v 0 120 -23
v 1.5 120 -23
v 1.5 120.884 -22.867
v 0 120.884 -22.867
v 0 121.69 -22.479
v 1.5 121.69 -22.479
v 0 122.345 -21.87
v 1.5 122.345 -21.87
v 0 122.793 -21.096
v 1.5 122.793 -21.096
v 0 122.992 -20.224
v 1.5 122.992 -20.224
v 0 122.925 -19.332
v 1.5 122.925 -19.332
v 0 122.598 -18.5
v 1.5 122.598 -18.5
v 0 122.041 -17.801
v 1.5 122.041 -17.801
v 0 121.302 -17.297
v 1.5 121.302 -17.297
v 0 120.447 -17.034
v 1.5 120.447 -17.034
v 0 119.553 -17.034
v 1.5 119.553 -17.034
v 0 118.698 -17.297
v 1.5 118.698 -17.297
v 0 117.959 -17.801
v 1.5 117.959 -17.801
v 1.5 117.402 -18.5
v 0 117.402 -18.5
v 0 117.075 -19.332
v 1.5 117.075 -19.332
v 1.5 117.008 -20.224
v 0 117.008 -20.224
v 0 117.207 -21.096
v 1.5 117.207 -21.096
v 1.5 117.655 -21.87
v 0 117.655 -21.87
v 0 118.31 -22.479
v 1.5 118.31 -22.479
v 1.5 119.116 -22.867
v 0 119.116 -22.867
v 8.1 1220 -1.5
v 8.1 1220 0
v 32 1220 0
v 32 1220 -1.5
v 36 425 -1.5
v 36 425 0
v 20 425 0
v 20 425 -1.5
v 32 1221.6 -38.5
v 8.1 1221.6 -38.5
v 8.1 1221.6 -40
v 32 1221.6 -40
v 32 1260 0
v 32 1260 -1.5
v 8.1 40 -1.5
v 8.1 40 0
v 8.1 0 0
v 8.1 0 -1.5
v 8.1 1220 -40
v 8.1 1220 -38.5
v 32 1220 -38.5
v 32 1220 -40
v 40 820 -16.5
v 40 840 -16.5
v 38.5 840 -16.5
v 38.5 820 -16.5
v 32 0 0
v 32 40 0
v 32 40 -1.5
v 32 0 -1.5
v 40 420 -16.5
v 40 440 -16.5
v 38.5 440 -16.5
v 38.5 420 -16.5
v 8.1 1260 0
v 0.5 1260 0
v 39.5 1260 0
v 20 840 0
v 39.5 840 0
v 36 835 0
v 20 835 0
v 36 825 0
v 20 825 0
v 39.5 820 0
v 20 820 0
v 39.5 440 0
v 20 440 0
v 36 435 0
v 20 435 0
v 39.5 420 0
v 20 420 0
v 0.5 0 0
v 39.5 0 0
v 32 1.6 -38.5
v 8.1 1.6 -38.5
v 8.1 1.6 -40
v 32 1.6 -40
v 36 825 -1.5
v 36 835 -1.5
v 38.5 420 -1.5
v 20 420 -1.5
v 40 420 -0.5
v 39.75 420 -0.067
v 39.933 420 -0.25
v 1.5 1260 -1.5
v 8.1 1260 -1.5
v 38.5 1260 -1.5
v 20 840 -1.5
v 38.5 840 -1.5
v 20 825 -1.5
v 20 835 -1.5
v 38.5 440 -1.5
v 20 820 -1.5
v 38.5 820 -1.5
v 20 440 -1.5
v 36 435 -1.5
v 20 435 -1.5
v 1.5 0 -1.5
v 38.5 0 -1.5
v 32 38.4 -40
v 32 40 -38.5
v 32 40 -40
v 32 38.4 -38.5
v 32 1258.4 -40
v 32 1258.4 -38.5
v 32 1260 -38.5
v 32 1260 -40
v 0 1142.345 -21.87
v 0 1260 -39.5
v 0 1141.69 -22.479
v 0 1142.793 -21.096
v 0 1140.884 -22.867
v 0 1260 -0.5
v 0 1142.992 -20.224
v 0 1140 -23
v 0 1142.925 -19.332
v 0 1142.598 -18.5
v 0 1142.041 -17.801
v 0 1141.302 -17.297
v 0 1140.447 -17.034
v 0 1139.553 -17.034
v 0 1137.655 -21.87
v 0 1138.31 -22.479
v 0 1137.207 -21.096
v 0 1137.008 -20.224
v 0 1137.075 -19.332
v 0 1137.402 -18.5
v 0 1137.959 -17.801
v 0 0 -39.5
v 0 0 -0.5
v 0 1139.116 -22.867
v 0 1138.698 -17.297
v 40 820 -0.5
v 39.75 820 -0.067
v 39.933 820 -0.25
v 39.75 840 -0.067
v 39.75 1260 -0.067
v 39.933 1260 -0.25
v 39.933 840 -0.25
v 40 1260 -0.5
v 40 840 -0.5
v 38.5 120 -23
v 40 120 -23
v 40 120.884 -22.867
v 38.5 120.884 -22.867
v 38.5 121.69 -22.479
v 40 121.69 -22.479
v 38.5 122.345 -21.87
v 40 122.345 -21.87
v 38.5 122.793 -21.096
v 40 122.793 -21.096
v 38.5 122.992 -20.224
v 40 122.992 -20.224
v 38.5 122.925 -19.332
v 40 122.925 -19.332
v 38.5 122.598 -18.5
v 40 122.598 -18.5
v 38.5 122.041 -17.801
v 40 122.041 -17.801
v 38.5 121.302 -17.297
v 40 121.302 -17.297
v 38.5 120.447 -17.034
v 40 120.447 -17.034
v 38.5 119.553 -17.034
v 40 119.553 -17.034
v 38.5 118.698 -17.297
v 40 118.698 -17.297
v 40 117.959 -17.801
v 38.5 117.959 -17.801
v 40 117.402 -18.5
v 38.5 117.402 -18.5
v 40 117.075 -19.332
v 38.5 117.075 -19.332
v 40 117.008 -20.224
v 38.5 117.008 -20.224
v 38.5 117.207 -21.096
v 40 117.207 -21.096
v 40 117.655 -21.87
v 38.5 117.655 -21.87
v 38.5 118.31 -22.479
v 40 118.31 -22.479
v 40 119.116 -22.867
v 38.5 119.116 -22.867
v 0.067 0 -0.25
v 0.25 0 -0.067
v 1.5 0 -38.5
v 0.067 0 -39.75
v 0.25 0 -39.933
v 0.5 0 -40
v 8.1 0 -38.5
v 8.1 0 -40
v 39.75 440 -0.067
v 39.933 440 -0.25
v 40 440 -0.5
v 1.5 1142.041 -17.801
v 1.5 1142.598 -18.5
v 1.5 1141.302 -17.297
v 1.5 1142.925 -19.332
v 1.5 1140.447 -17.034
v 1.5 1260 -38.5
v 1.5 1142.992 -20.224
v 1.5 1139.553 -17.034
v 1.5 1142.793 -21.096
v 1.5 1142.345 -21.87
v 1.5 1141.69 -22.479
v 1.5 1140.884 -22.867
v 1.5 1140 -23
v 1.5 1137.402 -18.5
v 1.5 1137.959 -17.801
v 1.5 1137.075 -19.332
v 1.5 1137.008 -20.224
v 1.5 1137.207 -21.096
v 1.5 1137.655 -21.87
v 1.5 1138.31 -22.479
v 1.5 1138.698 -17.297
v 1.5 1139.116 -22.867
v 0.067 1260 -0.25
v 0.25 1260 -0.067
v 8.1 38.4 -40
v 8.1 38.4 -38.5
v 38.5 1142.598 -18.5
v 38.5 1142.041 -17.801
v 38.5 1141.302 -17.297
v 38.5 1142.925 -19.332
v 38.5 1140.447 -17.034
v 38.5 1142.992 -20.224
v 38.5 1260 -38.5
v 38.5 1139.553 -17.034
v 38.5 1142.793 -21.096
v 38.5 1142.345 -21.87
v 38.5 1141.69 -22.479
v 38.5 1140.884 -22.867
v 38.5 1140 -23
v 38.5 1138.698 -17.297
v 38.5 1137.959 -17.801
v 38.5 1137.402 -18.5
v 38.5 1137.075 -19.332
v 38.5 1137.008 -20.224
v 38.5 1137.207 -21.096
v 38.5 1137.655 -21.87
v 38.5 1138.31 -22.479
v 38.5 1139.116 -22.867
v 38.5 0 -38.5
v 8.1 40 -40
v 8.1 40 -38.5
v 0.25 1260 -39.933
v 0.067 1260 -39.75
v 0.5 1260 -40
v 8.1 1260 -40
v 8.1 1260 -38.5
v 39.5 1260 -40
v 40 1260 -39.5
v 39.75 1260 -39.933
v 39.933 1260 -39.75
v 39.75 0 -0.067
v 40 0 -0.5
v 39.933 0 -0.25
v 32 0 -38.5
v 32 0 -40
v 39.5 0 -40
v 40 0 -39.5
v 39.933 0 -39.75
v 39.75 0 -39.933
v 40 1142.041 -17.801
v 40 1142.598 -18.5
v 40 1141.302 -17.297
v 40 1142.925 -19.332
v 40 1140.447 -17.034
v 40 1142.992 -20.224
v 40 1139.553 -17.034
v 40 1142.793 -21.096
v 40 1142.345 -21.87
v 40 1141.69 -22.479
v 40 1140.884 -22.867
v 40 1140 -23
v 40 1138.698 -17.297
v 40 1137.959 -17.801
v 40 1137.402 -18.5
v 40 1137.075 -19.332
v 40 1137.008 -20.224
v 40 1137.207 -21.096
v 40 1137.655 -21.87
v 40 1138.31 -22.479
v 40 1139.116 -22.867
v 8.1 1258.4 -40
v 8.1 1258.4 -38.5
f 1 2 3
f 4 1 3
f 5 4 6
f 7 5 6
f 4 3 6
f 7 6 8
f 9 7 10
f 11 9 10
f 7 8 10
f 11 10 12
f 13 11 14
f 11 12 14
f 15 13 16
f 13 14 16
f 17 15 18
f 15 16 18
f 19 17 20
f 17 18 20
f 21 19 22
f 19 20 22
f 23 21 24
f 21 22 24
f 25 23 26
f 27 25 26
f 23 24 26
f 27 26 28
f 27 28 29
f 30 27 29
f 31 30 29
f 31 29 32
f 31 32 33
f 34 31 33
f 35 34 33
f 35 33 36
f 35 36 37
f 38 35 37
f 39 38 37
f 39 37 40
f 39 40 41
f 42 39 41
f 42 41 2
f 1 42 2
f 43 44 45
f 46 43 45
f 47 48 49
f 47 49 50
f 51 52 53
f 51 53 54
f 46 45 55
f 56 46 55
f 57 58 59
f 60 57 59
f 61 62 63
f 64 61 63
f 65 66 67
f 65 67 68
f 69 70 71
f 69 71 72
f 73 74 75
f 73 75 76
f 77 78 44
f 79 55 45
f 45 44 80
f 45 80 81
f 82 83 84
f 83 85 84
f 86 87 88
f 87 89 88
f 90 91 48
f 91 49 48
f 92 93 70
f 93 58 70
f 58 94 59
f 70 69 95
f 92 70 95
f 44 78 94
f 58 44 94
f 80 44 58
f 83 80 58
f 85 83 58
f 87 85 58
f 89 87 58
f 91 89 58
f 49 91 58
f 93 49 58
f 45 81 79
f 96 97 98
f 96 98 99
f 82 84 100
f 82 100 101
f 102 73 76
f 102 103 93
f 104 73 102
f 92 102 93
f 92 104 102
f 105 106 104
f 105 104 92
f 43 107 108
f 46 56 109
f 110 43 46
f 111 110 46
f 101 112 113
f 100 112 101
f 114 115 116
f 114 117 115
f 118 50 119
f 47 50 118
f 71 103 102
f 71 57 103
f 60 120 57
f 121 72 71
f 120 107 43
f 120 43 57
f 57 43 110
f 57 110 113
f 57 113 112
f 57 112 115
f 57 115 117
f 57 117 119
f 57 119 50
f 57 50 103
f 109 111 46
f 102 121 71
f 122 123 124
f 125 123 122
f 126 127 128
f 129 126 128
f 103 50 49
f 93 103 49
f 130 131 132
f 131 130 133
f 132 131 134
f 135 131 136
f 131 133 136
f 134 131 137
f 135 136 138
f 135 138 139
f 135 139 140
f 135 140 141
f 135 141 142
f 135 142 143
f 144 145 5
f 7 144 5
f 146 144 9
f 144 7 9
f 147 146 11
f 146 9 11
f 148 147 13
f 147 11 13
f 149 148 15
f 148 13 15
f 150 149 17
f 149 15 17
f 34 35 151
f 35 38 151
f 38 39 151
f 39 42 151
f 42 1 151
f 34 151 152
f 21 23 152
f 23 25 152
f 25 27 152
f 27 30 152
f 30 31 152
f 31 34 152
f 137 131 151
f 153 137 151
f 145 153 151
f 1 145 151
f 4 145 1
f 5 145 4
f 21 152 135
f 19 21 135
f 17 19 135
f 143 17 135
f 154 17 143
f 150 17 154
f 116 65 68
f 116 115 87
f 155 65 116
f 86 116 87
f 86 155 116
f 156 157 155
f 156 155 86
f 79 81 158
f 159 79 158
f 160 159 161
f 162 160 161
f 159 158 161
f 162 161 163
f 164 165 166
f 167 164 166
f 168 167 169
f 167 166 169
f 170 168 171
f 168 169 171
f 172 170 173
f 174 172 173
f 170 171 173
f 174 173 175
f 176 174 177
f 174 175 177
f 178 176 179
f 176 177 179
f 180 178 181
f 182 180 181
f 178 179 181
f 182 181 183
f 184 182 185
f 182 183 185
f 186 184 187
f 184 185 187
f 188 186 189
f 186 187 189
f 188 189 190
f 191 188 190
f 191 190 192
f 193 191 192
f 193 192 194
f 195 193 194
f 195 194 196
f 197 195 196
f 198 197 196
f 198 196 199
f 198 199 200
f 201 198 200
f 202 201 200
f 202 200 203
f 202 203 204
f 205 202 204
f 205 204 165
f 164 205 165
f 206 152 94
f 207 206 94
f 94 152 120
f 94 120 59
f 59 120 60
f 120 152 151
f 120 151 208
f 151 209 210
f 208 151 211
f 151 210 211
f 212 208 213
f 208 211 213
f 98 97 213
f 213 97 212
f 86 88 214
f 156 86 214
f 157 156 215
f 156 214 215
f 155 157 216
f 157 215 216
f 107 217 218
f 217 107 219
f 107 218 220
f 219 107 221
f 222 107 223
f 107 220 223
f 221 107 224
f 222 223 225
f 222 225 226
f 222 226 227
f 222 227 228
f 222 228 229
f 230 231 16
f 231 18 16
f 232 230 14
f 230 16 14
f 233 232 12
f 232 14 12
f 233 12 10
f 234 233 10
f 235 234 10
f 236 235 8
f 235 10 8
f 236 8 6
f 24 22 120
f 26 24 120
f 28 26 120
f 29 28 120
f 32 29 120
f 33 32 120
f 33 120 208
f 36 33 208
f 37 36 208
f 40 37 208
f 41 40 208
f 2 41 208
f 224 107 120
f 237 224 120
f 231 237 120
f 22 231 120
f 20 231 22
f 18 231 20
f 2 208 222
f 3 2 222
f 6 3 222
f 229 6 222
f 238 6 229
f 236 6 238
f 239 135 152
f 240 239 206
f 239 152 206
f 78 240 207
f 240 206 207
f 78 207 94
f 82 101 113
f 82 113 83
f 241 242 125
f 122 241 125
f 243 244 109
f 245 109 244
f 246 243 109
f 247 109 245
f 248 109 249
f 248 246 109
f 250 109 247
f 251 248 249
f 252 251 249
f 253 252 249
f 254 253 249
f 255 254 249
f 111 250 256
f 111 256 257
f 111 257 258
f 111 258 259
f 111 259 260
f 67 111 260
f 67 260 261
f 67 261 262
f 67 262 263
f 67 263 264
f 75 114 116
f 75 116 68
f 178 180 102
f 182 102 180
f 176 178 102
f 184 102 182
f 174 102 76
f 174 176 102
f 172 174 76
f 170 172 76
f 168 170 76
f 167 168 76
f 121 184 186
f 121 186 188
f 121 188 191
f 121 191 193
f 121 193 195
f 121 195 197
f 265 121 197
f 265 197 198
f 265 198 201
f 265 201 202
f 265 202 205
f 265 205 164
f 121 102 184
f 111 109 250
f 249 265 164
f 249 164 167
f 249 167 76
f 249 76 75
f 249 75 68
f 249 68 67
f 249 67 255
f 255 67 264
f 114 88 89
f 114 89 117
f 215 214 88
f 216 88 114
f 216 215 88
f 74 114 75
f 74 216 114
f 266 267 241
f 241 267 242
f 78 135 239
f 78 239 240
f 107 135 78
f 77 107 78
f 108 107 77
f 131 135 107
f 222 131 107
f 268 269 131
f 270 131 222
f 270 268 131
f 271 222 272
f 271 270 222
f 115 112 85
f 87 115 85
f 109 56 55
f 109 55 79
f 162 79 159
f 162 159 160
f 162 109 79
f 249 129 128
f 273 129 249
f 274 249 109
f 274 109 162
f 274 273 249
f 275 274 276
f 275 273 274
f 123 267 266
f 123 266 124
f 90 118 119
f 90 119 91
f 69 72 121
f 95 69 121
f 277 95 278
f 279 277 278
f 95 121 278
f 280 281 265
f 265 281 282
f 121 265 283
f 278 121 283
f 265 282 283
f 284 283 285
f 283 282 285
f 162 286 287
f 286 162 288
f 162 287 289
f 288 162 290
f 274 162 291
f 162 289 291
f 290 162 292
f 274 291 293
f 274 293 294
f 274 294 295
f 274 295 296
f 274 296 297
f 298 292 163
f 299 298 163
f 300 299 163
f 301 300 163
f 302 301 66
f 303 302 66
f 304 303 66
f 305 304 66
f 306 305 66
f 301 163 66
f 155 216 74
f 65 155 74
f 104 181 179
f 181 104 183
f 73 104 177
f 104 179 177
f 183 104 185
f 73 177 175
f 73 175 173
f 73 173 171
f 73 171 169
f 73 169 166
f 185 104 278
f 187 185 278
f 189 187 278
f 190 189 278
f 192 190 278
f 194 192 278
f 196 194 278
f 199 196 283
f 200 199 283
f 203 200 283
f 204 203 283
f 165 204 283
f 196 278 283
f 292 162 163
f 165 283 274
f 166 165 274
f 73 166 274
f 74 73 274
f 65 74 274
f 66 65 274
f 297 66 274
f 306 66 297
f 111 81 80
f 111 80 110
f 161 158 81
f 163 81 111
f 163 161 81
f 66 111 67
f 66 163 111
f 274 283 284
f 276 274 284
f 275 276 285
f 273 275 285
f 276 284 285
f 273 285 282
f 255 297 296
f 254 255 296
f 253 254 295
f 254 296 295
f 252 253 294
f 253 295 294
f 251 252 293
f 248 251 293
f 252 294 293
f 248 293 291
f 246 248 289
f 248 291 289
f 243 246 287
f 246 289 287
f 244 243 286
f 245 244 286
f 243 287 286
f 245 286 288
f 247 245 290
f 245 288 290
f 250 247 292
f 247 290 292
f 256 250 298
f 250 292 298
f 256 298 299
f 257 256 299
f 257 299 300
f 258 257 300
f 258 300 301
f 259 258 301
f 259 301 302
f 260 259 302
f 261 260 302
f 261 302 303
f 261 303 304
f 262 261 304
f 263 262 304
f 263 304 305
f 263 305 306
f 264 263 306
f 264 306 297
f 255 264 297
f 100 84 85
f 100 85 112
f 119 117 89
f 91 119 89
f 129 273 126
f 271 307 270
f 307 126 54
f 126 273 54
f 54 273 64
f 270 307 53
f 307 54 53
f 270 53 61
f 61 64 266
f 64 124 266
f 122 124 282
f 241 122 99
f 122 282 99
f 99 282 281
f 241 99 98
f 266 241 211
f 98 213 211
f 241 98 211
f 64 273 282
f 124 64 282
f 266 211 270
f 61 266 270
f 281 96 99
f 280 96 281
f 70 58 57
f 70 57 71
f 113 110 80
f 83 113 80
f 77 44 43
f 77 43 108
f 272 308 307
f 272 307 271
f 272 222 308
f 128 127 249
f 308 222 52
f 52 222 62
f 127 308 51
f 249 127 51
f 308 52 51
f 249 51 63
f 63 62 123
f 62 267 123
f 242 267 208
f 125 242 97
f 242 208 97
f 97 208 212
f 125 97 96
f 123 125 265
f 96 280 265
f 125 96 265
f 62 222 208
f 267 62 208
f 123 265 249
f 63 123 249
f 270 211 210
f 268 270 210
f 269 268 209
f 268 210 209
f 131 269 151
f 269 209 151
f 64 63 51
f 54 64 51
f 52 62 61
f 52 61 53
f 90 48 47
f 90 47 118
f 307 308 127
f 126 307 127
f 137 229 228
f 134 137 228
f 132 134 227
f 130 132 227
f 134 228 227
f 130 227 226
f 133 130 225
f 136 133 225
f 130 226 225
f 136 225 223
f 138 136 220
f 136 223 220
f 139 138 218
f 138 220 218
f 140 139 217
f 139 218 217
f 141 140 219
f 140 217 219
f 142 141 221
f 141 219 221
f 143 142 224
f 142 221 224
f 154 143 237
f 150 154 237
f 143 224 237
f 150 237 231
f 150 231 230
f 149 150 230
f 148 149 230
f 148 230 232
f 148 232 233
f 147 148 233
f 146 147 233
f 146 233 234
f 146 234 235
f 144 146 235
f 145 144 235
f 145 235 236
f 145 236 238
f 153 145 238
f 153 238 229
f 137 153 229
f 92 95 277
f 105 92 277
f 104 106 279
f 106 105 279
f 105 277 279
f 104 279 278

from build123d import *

# Parameters (mm, degrees)
SKETCH1_W           = 37
SKETCH1_H           = 37
BOSS_EXTRUDE1_DEPTH = 1260
SKETCH2_W           = 23.9
SKETCH2_H           = 40
CUT_EXTRUDE1_DEPTH  = 20
SKETCH3_W           = 23.9
SKETCH3_H           = 1.6
CUT_EXTRUDE2_DEPTH  = 20
CUT_EXTRUDE3_DEPTH  = 20
SKETCH5_W           = 4
SKETCH5_H           = 10
CUT_EXTRUDE4_DEPTH  = 10
LPATTERN1_COUNT     = 2
LPATTERN1_PITCH     = 400
SKETCH6_R           = 3
CUT_EXTRUDE5_DEPTH  = 1262.269202034


with BuildPart() as part:
    # Sketch1 → Boss-Extrude1 (new body)
    with BuildSketch(Plane(origin=(0, 0, 0), x_dir=(1, 0, 0), z_dir=(0, 1, 0))):
        with BuildLine():
            Line((0.5, 0), (39.5, 0))
            ThreePointArc((39.5, 0), (39.853553391, 0.146446609), (40, 0.5))
            Line((40, 0.5), (40, 39.5))
            ThreePointArc((40, 39.5), (39.853553391, 39.853553391), (39.5, 40))
            Line((39.5, 40), (0.5, 40))
            ThreePointArc((0.5, 40), (0.146446609, 39.853553391), (0, 39.5))
            Line((0, 39.5), (0, 0.5))
            ThreePointArc((0, 0.5), (0.146446609, 0.146446609), (0.5, 0))
        make_face()
        with Locations((20, 20)):
            Rectangle(SKETCH1_W, SKETCH1_H, mode=Mode.SUBTRACT)
    extrude(amount=BOSS_EXTRUDE1_DEPTH)

    # Sketch2 → Cut-Extrude1 (cut)
    with BuildSketch(Plane.XY):
        with Locations((20.05, 1240)):
            Rectangle(SKETCH2_W, SKETCH2_H)
    cut_extrude1 = extrude(amount=-CUT_EXTRUDE1_DEPTH, mode=Mode.SUBTRACT)

    # Sketch3 → Cut-Extrude2 (cut)
    with BuildSketch(Plane.XY.offset(-38.5)):
        with Locations((20.05, 1259.2)):
            Rectangle(SKETCH3_W, SKETCH3_H)
        with Locations((20.05, 1220.8)):
            Rectangle(SKETCH3_W, SKETCH3_H)
    cut_extrude2 = extrude(amount=-CUT_EXTRUDE2_DEPTH, mode=Mode.SUBTRACT)

    # Mirror1: Cut-Extrude1, Cut-Extrude2 across plane
    add(cut_extrude1.mirror(Plane.ZX.offset(630)), mode=Mode.SUBTRACT)
    add(cut_extrude2.mirror(Plane.ZX.offset(630)), mode=Mode.SUBTRACT)

    # Sketch4 → Cut-Extrude3 (cut)
    with BuildSketch(Plane(origin=(40, 0, 0), x_dir=(0, 0, -1), z_dir=(1, 0, 0))):
        Polygon((0, 840), (16.5, 840), (16.5, 820), (0, 820), (0, 825), (5, 825), (5, 835), (0, 835), align=None)
    cut_extrude3 = extrude(amount=-CUT_EXTRUDE3_DEPTH, mode=Mode.SUBTRACT)

    # Sketch5 → Cut-Extrude4 (cut)
    with BuildSketch(Plane.XY):
        with Locations((38, 830)):
            Rectangle(SKETCH5_W, SKETCH5_H)
    cut_extrude4 = extrude(amount=-CUT_EXTRUDE4_DEPTH, mode=Mode.SUBTRACT)

    # LPattern1: Cut-Extrude3, Cut-Extrude4 ×2
    with Locations(*[(0, -i * LPATTERN1_PITCH, 0) for i in range(1, LPATTERN1_COUNT)]):
        add(cut_extrude3, mode=Mode.SUBTRACT)
        add(cut_extrude4, mode=Mode.SUBTRACT)

    # Sketch6 → Cut-Extrude5 (cut, through all)
    with BuildSketch(Plane(origin=(40, 0, 0), x_dir=(0, 0, -1), z_dir=(1, 0, 0))):
        with Locations((20, 1140)):
            Circle(SKETCH6_R)
        with Locations((20, 120)):
            Circle(SKETCH6_R)
    extrude(amount=-CUT_EXTRUDE5_DEPTH, mode=Mode.SUBTRACT)


solid = part.part
